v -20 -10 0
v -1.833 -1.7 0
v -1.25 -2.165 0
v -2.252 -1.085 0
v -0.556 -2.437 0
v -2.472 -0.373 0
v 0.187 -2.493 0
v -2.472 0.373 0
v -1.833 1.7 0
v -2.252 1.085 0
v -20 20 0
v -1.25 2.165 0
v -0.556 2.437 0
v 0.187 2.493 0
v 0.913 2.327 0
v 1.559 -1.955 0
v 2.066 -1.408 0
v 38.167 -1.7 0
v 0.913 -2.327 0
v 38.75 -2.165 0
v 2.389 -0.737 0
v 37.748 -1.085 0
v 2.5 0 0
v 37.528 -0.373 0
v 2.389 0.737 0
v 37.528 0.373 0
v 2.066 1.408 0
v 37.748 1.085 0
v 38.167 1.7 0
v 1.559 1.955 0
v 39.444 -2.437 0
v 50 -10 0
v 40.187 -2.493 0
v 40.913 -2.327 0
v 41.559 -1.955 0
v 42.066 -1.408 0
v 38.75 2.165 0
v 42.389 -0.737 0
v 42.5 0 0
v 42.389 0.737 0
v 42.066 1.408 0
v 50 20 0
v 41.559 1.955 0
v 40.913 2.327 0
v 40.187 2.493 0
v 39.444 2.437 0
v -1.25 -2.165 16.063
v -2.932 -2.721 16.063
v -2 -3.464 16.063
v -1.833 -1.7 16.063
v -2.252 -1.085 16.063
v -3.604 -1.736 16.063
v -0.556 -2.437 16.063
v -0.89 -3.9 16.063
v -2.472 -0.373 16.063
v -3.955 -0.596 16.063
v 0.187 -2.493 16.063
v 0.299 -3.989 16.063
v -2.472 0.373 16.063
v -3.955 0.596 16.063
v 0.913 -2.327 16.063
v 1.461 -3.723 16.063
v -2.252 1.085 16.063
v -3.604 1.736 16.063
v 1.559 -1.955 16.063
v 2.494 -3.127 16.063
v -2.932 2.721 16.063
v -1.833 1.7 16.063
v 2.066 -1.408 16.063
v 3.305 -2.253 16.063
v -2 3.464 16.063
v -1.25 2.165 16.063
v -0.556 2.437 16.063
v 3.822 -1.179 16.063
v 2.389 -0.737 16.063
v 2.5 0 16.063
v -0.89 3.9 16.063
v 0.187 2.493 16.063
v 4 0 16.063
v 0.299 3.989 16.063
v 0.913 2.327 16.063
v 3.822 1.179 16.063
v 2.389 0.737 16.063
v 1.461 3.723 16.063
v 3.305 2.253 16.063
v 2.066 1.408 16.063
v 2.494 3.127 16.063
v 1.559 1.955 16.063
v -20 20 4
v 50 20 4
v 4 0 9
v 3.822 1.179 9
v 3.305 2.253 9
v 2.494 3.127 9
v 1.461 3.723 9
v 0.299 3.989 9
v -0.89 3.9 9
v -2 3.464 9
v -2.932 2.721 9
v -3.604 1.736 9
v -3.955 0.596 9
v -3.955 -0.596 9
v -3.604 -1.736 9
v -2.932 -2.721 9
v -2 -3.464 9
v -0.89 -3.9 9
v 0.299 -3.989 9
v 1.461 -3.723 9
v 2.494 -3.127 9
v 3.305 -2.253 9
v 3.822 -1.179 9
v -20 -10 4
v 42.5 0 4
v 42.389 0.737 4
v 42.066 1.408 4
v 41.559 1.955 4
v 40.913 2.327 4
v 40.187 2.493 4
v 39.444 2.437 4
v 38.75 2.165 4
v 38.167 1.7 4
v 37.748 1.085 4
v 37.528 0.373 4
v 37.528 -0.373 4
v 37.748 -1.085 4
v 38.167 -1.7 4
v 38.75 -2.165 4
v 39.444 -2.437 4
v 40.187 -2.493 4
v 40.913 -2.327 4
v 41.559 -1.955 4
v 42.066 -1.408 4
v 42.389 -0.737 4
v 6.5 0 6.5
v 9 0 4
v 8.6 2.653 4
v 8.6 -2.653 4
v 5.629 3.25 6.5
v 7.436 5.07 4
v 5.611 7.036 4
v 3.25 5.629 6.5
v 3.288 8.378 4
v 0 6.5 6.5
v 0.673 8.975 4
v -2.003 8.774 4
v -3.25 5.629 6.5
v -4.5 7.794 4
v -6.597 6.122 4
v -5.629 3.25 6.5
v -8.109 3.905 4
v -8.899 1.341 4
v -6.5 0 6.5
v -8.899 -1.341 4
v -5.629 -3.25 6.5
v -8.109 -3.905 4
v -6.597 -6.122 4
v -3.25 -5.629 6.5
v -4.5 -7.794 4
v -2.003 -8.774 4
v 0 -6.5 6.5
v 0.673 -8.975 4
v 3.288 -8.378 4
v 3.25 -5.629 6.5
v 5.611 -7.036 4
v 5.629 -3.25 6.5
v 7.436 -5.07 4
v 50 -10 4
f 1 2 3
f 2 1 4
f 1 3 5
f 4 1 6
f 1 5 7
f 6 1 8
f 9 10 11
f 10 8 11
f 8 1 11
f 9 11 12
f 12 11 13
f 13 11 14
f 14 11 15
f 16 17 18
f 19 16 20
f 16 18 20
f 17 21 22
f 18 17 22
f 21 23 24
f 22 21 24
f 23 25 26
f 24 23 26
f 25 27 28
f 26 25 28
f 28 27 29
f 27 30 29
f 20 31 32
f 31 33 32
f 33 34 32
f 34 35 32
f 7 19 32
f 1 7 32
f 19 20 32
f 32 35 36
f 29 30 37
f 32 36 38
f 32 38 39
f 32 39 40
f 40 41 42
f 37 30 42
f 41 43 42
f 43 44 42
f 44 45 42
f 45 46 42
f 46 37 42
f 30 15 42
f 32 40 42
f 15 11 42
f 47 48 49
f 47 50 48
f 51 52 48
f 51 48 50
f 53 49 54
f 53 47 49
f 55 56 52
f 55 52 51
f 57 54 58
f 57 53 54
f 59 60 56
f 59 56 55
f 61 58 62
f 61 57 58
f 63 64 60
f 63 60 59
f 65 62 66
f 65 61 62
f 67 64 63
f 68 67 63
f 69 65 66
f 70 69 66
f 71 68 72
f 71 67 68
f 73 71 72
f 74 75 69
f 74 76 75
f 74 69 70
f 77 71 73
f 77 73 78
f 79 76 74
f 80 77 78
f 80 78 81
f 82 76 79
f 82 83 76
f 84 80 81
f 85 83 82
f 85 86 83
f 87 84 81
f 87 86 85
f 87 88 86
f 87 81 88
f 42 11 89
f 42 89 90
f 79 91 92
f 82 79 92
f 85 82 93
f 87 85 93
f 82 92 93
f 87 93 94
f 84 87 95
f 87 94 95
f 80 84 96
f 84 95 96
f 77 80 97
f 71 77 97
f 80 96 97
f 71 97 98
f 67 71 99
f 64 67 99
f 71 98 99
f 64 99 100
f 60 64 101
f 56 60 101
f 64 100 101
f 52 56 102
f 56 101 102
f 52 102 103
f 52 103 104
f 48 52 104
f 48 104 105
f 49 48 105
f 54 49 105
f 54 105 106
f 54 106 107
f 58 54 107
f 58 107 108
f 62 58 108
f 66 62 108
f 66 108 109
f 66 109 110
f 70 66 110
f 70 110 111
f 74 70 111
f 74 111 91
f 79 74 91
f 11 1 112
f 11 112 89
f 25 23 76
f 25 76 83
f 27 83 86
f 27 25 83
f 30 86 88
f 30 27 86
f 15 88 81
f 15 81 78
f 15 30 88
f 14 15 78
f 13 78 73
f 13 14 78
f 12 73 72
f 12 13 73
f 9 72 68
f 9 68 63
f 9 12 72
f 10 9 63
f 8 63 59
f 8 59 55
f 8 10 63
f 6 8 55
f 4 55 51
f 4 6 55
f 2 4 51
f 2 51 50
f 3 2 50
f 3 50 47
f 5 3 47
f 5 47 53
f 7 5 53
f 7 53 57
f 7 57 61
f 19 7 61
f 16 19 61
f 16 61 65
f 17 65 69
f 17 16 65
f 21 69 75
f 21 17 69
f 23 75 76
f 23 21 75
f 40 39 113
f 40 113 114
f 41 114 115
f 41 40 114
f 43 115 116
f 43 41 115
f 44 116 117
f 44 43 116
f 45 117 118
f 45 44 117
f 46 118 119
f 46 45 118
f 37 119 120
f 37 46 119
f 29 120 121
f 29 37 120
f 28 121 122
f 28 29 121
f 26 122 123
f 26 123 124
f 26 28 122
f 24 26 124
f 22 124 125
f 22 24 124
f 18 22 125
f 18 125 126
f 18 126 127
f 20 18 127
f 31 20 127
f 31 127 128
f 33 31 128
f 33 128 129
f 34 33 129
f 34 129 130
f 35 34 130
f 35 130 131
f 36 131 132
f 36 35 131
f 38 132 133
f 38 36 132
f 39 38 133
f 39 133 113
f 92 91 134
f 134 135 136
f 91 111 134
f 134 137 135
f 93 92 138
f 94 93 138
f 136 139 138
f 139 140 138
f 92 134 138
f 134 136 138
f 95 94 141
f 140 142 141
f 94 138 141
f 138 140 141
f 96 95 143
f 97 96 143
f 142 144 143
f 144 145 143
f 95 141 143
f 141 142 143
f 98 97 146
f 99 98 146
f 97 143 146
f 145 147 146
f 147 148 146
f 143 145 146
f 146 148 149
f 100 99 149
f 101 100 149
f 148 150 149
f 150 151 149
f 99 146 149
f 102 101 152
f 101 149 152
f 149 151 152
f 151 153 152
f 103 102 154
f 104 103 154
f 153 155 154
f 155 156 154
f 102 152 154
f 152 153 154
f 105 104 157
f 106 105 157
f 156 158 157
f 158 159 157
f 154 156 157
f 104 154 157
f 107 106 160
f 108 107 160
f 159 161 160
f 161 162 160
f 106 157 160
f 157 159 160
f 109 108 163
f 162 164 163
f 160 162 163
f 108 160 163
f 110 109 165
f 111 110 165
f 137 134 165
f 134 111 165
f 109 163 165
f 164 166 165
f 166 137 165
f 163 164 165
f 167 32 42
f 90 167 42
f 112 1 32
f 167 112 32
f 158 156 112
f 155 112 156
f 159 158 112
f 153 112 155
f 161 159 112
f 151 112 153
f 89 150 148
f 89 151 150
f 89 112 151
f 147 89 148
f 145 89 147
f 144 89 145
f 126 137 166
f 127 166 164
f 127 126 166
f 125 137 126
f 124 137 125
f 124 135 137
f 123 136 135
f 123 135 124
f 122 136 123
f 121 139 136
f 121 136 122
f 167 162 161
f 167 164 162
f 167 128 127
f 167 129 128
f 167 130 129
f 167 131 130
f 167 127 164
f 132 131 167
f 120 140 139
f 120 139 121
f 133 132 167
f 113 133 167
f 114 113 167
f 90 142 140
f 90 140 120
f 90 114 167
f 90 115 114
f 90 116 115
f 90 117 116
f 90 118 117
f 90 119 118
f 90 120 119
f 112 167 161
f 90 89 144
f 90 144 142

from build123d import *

# Parameters (mm, degrees)
SKETCH1_W           = 70
SKETCH1_H           = 30
SKETCH1_R           = 4
SKETCH1_R_2         = 2.5
BOSS_EXTRUDE1_DEPTH = 4
SKETCH1_3_R         = 4
SKETCH1_3_R_2       = 2.5
BOSS_EXTRUDE2_DEPTH = 16.063
CHAMFER1_SIZE       = 5


with BuildPart() as part:
    # Sketch1 → Boss-Extrude1 (new body)
    with BuildSketch(Plane.XY):
        with Locations((15, 5)):
            Rectangle(SKETCH1_W, SKETCH1_H)
        Circle(SKETCH1_R, mode=Mode.SUBTRACT)
        with Locations((40, 0)):
            Circle(SKETCH1_R_2, mode=Mode.SUBTRACT)
    extrude(amount=BOSS_EXTRUDE1_DEPTH)

    # Sketch1<3> → Boss-Extrude2 (add)
    with BuildSketch(Plane.XY):
        Circle(SKETCH1_3_R)
        Circle(SKETCH1_3_R_2, mode=Mode.SUBTRACT)
    extrude(amount=BOSS_EXTRUDE2_DEPTH)

    # Chamfer1
    chamfer1_edges = [part.edges().sort_by_distance(p)[0] for p in [
        (-4, 0, 4),
    ]]
    chamfer(chamfer1_edges, length=CHAMFER1_SIZE)


solid = part.part
